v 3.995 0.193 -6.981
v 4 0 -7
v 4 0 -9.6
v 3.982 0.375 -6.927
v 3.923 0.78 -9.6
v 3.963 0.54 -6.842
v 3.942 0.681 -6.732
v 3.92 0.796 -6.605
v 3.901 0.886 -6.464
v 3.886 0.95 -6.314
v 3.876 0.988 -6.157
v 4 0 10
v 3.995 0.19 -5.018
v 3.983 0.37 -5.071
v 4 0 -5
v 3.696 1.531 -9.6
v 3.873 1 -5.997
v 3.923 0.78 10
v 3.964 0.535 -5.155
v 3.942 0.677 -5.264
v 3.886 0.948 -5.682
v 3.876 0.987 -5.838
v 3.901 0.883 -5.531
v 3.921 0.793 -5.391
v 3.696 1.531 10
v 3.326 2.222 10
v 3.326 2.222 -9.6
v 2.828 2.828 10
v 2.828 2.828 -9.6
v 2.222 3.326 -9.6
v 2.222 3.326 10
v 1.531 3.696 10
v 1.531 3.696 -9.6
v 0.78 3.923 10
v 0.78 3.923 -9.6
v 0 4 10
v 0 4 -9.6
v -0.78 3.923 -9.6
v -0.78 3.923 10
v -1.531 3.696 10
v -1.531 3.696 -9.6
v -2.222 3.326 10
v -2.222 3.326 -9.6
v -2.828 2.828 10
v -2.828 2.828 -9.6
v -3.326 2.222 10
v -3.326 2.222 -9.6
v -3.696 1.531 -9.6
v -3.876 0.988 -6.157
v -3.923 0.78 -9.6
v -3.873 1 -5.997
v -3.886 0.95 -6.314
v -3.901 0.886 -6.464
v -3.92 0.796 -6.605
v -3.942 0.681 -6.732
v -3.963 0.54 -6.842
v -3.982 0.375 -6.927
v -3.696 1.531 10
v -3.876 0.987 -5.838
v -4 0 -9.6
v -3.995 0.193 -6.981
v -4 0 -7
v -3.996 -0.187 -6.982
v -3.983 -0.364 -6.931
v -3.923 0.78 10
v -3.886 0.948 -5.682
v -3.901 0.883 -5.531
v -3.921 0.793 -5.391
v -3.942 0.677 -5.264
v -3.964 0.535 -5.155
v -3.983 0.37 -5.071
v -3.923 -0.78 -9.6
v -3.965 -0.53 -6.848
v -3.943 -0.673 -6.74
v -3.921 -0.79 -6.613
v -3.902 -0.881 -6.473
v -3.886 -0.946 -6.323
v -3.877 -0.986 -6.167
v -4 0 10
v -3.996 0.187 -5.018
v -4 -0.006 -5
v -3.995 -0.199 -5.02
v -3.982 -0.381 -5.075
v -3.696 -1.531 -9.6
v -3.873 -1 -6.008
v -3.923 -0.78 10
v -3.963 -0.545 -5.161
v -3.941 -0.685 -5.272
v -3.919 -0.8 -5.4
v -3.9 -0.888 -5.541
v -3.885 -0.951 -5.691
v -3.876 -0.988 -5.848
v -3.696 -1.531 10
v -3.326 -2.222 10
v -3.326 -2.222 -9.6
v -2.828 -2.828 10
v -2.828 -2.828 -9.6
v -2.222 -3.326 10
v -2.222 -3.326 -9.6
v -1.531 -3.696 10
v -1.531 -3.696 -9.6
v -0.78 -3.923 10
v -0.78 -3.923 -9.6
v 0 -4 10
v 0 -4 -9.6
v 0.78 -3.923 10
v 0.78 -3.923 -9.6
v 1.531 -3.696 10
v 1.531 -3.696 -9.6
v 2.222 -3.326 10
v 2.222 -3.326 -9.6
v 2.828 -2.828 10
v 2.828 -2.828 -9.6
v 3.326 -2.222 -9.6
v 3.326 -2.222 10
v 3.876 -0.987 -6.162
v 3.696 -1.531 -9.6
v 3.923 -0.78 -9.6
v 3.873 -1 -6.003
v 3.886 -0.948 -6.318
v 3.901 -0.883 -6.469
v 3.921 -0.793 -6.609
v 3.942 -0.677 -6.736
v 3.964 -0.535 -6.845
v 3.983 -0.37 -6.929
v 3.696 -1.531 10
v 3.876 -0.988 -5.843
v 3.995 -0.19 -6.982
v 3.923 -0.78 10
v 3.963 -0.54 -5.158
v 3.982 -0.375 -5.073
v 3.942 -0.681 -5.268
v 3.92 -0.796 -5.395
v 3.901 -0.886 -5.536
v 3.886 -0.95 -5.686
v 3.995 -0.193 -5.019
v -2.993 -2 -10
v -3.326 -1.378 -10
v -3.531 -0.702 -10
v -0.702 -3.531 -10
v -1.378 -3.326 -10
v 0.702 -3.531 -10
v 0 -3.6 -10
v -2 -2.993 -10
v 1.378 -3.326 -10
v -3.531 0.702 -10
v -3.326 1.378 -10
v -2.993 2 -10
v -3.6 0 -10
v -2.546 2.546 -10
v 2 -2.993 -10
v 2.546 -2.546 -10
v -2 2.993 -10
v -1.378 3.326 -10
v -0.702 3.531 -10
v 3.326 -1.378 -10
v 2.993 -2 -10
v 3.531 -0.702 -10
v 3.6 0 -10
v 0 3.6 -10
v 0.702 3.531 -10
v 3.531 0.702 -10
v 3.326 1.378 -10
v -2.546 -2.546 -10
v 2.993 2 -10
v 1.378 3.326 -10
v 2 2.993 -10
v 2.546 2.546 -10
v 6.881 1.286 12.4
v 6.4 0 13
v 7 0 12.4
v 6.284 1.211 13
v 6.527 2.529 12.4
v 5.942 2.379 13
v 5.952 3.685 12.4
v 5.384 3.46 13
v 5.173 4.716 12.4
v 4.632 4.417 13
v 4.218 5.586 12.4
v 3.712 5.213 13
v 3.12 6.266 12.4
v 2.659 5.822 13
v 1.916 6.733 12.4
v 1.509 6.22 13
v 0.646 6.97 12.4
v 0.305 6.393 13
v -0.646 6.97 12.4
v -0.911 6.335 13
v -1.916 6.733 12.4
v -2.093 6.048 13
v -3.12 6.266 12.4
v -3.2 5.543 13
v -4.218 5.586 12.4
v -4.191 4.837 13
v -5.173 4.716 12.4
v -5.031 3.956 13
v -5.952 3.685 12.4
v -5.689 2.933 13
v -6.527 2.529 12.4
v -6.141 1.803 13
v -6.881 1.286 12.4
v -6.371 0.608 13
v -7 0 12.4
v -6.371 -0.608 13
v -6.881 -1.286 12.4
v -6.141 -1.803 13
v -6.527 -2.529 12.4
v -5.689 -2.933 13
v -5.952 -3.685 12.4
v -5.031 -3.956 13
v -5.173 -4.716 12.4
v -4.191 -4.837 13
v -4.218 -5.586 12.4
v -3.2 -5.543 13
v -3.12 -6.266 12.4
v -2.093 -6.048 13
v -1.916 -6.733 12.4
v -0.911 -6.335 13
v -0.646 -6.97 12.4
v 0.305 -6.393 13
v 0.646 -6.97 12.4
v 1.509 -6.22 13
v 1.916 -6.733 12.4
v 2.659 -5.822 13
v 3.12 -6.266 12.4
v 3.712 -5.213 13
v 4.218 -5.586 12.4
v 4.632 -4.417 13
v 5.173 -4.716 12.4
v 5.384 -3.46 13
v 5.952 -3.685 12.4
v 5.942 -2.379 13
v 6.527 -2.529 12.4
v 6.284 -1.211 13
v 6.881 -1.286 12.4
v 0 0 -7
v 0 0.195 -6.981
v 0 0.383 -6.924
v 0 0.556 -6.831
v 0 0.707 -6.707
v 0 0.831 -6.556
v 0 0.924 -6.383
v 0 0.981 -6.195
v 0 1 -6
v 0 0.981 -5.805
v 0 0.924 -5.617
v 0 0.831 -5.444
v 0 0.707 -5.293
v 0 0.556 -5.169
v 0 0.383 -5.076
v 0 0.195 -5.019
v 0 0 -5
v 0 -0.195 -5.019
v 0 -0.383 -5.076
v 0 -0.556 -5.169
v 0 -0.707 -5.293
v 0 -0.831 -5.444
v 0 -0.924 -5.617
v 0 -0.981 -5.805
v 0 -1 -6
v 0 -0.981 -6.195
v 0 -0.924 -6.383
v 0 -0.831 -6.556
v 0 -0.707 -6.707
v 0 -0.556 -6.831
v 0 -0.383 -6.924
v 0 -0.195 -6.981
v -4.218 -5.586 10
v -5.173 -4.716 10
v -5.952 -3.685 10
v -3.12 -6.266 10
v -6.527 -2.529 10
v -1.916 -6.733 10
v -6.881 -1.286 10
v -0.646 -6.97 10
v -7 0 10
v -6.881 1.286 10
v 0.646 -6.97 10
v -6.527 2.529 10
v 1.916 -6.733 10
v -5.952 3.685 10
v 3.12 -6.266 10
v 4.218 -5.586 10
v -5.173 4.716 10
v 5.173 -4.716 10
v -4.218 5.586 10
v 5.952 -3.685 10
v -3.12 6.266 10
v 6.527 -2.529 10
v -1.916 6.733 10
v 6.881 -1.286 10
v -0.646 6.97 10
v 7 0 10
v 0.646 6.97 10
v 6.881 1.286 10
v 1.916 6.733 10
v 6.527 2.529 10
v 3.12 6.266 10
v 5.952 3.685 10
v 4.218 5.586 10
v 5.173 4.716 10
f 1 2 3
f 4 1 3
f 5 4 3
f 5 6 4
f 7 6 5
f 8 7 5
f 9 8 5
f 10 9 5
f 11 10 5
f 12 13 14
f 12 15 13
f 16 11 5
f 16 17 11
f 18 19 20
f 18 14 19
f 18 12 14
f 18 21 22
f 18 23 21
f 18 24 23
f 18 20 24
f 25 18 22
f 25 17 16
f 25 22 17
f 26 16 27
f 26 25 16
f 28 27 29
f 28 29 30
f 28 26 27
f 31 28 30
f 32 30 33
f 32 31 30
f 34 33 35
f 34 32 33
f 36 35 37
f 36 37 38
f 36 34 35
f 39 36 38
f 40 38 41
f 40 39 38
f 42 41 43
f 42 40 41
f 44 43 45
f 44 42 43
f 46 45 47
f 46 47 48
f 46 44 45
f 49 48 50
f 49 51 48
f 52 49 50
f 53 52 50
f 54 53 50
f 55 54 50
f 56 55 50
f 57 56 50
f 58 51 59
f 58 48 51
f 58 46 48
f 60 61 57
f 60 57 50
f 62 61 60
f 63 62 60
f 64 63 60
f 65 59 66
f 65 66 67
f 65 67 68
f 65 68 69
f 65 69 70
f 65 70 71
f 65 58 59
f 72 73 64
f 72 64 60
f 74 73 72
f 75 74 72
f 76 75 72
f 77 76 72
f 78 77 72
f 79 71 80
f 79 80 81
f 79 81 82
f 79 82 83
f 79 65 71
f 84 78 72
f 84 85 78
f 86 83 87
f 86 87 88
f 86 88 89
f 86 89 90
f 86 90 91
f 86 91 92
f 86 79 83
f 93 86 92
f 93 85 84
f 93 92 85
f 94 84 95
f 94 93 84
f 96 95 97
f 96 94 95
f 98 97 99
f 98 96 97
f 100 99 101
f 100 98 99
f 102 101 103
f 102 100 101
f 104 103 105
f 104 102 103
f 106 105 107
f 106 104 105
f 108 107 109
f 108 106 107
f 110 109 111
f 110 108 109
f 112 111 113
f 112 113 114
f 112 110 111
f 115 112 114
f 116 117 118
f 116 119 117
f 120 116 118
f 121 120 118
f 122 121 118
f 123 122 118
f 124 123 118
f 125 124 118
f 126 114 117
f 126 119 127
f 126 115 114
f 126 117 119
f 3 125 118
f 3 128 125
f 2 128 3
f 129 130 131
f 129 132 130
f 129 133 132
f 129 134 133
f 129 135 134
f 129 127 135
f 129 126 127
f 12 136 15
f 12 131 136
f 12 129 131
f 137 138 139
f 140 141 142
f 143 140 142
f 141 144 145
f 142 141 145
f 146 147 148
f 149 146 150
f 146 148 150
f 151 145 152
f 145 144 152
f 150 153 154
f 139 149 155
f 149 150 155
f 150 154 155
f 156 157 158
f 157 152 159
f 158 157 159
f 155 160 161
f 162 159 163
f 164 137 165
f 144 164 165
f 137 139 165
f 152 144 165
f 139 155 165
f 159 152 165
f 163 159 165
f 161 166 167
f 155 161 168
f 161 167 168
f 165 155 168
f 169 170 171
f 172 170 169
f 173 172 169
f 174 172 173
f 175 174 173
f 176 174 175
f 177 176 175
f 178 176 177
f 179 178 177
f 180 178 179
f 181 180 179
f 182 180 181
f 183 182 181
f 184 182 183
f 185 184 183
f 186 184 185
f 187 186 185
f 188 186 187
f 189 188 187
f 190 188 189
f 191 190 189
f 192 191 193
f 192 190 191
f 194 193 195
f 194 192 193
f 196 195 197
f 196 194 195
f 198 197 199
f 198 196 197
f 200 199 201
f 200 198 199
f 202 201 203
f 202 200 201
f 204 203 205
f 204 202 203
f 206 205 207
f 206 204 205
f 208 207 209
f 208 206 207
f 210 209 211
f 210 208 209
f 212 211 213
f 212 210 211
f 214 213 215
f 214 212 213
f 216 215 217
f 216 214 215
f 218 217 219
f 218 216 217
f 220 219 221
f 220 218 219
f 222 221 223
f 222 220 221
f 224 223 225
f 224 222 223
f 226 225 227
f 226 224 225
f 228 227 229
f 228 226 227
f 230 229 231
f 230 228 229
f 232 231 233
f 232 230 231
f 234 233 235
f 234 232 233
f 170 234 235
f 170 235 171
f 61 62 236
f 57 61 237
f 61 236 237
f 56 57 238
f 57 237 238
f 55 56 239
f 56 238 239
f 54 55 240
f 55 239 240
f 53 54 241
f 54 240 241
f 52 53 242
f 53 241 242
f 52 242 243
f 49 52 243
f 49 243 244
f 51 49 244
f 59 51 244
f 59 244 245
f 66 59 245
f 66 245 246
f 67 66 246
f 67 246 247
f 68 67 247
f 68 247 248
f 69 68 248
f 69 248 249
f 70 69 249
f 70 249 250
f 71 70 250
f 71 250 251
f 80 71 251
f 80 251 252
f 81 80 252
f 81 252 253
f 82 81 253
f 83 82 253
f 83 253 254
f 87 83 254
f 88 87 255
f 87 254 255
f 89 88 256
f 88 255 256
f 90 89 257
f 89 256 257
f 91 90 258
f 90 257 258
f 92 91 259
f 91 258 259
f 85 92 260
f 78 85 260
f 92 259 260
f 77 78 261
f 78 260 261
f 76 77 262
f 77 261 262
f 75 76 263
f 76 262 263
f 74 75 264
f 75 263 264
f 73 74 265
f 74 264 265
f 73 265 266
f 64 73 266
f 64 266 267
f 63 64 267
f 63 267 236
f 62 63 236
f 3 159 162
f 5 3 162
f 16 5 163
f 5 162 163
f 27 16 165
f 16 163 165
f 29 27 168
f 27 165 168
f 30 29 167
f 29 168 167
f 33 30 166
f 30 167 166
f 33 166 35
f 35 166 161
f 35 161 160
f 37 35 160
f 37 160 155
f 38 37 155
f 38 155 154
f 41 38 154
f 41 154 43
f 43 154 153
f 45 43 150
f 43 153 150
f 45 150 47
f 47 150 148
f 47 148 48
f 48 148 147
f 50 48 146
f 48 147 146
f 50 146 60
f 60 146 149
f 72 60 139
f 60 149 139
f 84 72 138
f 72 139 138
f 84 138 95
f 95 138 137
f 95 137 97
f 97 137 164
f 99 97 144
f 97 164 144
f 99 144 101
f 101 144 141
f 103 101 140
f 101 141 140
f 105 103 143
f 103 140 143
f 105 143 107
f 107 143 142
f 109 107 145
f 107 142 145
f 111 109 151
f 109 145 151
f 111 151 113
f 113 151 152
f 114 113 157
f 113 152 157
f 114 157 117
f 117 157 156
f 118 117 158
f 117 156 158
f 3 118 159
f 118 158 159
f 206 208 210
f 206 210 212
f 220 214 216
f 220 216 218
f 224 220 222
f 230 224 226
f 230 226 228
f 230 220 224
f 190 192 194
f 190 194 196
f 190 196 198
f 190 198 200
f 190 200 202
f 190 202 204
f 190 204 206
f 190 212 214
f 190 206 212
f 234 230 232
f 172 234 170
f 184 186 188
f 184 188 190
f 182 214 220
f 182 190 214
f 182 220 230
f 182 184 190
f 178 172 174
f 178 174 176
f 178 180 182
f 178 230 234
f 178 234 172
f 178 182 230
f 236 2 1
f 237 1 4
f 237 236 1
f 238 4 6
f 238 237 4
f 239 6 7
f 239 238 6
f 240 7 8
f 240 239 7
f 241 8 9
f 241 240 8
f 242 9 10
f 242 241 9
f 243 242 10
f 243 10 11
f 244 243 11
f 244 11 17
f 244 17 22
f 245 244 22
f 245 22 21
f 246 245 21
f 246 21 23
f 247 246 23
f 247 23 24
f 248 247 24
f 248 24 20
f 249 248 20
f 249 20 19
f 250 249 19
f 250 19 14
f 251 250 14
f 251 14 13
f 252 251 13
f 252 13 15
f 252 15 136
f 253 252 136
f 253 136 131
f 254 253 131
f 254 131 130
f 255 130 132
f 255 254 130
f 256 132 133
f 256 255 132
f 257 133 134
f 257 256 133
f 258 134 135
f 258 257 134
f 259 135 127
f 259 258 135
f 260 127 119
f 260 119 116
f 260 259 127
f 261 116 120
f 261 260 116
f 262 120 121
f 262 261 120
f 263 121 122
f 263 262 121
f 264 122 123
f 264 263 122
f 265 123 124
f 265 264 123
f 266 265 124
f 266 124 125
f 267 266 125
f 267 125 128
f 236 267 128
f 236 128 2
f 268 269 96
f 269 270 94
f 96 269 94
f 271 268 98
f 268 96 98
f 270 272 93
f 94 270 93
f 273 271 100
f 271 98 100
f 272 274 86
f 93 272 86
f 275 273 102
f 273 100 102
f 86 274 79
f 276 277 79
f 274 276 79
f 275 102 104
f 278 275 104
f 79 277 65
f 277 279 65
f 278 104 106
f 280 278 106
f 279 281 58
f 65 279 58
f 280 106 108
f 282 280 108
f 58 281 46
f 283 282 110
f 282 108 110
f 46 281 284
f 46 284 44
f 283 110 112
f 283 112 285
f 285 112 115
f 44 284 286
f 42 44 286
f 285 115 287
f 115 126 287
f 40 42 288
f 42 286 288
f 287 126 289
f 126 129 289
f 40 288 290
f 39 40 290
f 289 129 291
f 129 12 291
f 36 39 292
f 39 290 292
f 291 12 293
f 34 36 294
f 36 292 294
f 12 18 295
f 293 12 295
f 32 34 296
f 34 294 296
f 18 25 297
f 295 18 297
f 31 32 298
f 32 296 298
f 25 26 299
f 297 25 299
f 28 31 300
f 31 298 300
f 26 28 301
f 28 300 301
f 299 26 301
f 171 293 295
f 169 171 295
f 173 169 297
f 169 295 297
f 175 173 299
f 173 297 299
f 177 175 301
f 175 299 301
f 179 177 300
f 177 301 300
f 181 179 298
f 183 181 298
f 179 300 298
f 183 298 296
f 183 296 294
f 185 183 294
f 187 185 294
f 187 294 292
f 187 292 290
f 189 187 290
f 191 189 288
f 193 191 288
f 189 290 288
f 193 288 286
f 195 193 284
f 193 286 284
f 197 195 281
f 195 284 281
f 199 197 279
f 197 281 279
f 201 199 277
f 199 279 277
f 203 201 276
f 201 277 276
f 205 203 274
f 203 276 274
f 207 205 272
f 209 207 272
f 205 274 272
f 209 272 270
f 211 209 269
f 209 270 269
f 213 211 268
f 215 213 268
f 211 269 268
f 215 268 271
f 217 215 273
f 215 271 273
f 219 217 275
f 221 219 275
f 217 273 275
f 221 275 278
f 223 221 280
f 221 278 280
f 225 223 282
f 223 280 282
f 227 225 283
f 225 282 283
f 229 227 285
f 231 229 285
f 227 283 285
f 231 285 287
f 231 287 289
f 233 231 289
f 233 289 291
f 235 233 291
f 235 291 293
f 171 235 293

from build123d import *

# Parameters (mm, degrees)
SKETCH1_R           = 4
EXTRUDE1_DEPTH      = 10
SKETCH2_R           = 7
EXTRUDE2_DEPTH      = 3
CHAMFER1_SIZE       = 0.6
SKETCH3_R           = 1
EXTRUDE3_DEPTH      = 8
EXTRUDE3_DEPTH_BACK = 8
CHAMFER2_SIZE       = 0.4


with BuildPart() as part:
    # Sketch1 → Extrude1 (new body, symmetric)
    with BuildSketch(Plane.XY):
        Circle(SKETCH1_R)
    extrude(amount=EXTRUDE1_DEPTH, both=True)

    # Sketch2 → Extrude2 (add)
    with BuildSketch(Plane.XY.offset(10)):
        Circle(SKETCH2_R)
    extrude(amount=EXTRUDE2_DEPTH)

    # Chamfer1
    chamfer1_edges = [part.edges().sort_by_distance(p)[0] for p in [
        (-7, 0, 13),
    ]]
    chamfer(chamfer1_edges, length=CHAMFER1_SIZE)

    # Sketch3 → Extrude3 (cut, two sides)
    with BuildSketch(Plane(origin=(0, 0, 0), x_dir=(0, 0, -1), z_dir=(1, 0, 0))) as extrude3_sk:
        with Locations((6, 0)):
            Circle(SKETCH3_R)
    extrude(amount=EXTRUDE3_DEPTH, mode=Mode.SUBTRACT)
    extrude(extrude3_sk.sketch, amount=-EXTRUDE3_DEPTH_BACK, mode=Mode.SUBTRACT)

    # Chamfer2
    chamfer2_edges = [part.edges().sort_by_distance(p)[0] for p in [
        (-4, 0, -10),
    ]]
    chamfer(chamfer2_edges, length=CHAMFER2_SIZE)


solid = part.part
